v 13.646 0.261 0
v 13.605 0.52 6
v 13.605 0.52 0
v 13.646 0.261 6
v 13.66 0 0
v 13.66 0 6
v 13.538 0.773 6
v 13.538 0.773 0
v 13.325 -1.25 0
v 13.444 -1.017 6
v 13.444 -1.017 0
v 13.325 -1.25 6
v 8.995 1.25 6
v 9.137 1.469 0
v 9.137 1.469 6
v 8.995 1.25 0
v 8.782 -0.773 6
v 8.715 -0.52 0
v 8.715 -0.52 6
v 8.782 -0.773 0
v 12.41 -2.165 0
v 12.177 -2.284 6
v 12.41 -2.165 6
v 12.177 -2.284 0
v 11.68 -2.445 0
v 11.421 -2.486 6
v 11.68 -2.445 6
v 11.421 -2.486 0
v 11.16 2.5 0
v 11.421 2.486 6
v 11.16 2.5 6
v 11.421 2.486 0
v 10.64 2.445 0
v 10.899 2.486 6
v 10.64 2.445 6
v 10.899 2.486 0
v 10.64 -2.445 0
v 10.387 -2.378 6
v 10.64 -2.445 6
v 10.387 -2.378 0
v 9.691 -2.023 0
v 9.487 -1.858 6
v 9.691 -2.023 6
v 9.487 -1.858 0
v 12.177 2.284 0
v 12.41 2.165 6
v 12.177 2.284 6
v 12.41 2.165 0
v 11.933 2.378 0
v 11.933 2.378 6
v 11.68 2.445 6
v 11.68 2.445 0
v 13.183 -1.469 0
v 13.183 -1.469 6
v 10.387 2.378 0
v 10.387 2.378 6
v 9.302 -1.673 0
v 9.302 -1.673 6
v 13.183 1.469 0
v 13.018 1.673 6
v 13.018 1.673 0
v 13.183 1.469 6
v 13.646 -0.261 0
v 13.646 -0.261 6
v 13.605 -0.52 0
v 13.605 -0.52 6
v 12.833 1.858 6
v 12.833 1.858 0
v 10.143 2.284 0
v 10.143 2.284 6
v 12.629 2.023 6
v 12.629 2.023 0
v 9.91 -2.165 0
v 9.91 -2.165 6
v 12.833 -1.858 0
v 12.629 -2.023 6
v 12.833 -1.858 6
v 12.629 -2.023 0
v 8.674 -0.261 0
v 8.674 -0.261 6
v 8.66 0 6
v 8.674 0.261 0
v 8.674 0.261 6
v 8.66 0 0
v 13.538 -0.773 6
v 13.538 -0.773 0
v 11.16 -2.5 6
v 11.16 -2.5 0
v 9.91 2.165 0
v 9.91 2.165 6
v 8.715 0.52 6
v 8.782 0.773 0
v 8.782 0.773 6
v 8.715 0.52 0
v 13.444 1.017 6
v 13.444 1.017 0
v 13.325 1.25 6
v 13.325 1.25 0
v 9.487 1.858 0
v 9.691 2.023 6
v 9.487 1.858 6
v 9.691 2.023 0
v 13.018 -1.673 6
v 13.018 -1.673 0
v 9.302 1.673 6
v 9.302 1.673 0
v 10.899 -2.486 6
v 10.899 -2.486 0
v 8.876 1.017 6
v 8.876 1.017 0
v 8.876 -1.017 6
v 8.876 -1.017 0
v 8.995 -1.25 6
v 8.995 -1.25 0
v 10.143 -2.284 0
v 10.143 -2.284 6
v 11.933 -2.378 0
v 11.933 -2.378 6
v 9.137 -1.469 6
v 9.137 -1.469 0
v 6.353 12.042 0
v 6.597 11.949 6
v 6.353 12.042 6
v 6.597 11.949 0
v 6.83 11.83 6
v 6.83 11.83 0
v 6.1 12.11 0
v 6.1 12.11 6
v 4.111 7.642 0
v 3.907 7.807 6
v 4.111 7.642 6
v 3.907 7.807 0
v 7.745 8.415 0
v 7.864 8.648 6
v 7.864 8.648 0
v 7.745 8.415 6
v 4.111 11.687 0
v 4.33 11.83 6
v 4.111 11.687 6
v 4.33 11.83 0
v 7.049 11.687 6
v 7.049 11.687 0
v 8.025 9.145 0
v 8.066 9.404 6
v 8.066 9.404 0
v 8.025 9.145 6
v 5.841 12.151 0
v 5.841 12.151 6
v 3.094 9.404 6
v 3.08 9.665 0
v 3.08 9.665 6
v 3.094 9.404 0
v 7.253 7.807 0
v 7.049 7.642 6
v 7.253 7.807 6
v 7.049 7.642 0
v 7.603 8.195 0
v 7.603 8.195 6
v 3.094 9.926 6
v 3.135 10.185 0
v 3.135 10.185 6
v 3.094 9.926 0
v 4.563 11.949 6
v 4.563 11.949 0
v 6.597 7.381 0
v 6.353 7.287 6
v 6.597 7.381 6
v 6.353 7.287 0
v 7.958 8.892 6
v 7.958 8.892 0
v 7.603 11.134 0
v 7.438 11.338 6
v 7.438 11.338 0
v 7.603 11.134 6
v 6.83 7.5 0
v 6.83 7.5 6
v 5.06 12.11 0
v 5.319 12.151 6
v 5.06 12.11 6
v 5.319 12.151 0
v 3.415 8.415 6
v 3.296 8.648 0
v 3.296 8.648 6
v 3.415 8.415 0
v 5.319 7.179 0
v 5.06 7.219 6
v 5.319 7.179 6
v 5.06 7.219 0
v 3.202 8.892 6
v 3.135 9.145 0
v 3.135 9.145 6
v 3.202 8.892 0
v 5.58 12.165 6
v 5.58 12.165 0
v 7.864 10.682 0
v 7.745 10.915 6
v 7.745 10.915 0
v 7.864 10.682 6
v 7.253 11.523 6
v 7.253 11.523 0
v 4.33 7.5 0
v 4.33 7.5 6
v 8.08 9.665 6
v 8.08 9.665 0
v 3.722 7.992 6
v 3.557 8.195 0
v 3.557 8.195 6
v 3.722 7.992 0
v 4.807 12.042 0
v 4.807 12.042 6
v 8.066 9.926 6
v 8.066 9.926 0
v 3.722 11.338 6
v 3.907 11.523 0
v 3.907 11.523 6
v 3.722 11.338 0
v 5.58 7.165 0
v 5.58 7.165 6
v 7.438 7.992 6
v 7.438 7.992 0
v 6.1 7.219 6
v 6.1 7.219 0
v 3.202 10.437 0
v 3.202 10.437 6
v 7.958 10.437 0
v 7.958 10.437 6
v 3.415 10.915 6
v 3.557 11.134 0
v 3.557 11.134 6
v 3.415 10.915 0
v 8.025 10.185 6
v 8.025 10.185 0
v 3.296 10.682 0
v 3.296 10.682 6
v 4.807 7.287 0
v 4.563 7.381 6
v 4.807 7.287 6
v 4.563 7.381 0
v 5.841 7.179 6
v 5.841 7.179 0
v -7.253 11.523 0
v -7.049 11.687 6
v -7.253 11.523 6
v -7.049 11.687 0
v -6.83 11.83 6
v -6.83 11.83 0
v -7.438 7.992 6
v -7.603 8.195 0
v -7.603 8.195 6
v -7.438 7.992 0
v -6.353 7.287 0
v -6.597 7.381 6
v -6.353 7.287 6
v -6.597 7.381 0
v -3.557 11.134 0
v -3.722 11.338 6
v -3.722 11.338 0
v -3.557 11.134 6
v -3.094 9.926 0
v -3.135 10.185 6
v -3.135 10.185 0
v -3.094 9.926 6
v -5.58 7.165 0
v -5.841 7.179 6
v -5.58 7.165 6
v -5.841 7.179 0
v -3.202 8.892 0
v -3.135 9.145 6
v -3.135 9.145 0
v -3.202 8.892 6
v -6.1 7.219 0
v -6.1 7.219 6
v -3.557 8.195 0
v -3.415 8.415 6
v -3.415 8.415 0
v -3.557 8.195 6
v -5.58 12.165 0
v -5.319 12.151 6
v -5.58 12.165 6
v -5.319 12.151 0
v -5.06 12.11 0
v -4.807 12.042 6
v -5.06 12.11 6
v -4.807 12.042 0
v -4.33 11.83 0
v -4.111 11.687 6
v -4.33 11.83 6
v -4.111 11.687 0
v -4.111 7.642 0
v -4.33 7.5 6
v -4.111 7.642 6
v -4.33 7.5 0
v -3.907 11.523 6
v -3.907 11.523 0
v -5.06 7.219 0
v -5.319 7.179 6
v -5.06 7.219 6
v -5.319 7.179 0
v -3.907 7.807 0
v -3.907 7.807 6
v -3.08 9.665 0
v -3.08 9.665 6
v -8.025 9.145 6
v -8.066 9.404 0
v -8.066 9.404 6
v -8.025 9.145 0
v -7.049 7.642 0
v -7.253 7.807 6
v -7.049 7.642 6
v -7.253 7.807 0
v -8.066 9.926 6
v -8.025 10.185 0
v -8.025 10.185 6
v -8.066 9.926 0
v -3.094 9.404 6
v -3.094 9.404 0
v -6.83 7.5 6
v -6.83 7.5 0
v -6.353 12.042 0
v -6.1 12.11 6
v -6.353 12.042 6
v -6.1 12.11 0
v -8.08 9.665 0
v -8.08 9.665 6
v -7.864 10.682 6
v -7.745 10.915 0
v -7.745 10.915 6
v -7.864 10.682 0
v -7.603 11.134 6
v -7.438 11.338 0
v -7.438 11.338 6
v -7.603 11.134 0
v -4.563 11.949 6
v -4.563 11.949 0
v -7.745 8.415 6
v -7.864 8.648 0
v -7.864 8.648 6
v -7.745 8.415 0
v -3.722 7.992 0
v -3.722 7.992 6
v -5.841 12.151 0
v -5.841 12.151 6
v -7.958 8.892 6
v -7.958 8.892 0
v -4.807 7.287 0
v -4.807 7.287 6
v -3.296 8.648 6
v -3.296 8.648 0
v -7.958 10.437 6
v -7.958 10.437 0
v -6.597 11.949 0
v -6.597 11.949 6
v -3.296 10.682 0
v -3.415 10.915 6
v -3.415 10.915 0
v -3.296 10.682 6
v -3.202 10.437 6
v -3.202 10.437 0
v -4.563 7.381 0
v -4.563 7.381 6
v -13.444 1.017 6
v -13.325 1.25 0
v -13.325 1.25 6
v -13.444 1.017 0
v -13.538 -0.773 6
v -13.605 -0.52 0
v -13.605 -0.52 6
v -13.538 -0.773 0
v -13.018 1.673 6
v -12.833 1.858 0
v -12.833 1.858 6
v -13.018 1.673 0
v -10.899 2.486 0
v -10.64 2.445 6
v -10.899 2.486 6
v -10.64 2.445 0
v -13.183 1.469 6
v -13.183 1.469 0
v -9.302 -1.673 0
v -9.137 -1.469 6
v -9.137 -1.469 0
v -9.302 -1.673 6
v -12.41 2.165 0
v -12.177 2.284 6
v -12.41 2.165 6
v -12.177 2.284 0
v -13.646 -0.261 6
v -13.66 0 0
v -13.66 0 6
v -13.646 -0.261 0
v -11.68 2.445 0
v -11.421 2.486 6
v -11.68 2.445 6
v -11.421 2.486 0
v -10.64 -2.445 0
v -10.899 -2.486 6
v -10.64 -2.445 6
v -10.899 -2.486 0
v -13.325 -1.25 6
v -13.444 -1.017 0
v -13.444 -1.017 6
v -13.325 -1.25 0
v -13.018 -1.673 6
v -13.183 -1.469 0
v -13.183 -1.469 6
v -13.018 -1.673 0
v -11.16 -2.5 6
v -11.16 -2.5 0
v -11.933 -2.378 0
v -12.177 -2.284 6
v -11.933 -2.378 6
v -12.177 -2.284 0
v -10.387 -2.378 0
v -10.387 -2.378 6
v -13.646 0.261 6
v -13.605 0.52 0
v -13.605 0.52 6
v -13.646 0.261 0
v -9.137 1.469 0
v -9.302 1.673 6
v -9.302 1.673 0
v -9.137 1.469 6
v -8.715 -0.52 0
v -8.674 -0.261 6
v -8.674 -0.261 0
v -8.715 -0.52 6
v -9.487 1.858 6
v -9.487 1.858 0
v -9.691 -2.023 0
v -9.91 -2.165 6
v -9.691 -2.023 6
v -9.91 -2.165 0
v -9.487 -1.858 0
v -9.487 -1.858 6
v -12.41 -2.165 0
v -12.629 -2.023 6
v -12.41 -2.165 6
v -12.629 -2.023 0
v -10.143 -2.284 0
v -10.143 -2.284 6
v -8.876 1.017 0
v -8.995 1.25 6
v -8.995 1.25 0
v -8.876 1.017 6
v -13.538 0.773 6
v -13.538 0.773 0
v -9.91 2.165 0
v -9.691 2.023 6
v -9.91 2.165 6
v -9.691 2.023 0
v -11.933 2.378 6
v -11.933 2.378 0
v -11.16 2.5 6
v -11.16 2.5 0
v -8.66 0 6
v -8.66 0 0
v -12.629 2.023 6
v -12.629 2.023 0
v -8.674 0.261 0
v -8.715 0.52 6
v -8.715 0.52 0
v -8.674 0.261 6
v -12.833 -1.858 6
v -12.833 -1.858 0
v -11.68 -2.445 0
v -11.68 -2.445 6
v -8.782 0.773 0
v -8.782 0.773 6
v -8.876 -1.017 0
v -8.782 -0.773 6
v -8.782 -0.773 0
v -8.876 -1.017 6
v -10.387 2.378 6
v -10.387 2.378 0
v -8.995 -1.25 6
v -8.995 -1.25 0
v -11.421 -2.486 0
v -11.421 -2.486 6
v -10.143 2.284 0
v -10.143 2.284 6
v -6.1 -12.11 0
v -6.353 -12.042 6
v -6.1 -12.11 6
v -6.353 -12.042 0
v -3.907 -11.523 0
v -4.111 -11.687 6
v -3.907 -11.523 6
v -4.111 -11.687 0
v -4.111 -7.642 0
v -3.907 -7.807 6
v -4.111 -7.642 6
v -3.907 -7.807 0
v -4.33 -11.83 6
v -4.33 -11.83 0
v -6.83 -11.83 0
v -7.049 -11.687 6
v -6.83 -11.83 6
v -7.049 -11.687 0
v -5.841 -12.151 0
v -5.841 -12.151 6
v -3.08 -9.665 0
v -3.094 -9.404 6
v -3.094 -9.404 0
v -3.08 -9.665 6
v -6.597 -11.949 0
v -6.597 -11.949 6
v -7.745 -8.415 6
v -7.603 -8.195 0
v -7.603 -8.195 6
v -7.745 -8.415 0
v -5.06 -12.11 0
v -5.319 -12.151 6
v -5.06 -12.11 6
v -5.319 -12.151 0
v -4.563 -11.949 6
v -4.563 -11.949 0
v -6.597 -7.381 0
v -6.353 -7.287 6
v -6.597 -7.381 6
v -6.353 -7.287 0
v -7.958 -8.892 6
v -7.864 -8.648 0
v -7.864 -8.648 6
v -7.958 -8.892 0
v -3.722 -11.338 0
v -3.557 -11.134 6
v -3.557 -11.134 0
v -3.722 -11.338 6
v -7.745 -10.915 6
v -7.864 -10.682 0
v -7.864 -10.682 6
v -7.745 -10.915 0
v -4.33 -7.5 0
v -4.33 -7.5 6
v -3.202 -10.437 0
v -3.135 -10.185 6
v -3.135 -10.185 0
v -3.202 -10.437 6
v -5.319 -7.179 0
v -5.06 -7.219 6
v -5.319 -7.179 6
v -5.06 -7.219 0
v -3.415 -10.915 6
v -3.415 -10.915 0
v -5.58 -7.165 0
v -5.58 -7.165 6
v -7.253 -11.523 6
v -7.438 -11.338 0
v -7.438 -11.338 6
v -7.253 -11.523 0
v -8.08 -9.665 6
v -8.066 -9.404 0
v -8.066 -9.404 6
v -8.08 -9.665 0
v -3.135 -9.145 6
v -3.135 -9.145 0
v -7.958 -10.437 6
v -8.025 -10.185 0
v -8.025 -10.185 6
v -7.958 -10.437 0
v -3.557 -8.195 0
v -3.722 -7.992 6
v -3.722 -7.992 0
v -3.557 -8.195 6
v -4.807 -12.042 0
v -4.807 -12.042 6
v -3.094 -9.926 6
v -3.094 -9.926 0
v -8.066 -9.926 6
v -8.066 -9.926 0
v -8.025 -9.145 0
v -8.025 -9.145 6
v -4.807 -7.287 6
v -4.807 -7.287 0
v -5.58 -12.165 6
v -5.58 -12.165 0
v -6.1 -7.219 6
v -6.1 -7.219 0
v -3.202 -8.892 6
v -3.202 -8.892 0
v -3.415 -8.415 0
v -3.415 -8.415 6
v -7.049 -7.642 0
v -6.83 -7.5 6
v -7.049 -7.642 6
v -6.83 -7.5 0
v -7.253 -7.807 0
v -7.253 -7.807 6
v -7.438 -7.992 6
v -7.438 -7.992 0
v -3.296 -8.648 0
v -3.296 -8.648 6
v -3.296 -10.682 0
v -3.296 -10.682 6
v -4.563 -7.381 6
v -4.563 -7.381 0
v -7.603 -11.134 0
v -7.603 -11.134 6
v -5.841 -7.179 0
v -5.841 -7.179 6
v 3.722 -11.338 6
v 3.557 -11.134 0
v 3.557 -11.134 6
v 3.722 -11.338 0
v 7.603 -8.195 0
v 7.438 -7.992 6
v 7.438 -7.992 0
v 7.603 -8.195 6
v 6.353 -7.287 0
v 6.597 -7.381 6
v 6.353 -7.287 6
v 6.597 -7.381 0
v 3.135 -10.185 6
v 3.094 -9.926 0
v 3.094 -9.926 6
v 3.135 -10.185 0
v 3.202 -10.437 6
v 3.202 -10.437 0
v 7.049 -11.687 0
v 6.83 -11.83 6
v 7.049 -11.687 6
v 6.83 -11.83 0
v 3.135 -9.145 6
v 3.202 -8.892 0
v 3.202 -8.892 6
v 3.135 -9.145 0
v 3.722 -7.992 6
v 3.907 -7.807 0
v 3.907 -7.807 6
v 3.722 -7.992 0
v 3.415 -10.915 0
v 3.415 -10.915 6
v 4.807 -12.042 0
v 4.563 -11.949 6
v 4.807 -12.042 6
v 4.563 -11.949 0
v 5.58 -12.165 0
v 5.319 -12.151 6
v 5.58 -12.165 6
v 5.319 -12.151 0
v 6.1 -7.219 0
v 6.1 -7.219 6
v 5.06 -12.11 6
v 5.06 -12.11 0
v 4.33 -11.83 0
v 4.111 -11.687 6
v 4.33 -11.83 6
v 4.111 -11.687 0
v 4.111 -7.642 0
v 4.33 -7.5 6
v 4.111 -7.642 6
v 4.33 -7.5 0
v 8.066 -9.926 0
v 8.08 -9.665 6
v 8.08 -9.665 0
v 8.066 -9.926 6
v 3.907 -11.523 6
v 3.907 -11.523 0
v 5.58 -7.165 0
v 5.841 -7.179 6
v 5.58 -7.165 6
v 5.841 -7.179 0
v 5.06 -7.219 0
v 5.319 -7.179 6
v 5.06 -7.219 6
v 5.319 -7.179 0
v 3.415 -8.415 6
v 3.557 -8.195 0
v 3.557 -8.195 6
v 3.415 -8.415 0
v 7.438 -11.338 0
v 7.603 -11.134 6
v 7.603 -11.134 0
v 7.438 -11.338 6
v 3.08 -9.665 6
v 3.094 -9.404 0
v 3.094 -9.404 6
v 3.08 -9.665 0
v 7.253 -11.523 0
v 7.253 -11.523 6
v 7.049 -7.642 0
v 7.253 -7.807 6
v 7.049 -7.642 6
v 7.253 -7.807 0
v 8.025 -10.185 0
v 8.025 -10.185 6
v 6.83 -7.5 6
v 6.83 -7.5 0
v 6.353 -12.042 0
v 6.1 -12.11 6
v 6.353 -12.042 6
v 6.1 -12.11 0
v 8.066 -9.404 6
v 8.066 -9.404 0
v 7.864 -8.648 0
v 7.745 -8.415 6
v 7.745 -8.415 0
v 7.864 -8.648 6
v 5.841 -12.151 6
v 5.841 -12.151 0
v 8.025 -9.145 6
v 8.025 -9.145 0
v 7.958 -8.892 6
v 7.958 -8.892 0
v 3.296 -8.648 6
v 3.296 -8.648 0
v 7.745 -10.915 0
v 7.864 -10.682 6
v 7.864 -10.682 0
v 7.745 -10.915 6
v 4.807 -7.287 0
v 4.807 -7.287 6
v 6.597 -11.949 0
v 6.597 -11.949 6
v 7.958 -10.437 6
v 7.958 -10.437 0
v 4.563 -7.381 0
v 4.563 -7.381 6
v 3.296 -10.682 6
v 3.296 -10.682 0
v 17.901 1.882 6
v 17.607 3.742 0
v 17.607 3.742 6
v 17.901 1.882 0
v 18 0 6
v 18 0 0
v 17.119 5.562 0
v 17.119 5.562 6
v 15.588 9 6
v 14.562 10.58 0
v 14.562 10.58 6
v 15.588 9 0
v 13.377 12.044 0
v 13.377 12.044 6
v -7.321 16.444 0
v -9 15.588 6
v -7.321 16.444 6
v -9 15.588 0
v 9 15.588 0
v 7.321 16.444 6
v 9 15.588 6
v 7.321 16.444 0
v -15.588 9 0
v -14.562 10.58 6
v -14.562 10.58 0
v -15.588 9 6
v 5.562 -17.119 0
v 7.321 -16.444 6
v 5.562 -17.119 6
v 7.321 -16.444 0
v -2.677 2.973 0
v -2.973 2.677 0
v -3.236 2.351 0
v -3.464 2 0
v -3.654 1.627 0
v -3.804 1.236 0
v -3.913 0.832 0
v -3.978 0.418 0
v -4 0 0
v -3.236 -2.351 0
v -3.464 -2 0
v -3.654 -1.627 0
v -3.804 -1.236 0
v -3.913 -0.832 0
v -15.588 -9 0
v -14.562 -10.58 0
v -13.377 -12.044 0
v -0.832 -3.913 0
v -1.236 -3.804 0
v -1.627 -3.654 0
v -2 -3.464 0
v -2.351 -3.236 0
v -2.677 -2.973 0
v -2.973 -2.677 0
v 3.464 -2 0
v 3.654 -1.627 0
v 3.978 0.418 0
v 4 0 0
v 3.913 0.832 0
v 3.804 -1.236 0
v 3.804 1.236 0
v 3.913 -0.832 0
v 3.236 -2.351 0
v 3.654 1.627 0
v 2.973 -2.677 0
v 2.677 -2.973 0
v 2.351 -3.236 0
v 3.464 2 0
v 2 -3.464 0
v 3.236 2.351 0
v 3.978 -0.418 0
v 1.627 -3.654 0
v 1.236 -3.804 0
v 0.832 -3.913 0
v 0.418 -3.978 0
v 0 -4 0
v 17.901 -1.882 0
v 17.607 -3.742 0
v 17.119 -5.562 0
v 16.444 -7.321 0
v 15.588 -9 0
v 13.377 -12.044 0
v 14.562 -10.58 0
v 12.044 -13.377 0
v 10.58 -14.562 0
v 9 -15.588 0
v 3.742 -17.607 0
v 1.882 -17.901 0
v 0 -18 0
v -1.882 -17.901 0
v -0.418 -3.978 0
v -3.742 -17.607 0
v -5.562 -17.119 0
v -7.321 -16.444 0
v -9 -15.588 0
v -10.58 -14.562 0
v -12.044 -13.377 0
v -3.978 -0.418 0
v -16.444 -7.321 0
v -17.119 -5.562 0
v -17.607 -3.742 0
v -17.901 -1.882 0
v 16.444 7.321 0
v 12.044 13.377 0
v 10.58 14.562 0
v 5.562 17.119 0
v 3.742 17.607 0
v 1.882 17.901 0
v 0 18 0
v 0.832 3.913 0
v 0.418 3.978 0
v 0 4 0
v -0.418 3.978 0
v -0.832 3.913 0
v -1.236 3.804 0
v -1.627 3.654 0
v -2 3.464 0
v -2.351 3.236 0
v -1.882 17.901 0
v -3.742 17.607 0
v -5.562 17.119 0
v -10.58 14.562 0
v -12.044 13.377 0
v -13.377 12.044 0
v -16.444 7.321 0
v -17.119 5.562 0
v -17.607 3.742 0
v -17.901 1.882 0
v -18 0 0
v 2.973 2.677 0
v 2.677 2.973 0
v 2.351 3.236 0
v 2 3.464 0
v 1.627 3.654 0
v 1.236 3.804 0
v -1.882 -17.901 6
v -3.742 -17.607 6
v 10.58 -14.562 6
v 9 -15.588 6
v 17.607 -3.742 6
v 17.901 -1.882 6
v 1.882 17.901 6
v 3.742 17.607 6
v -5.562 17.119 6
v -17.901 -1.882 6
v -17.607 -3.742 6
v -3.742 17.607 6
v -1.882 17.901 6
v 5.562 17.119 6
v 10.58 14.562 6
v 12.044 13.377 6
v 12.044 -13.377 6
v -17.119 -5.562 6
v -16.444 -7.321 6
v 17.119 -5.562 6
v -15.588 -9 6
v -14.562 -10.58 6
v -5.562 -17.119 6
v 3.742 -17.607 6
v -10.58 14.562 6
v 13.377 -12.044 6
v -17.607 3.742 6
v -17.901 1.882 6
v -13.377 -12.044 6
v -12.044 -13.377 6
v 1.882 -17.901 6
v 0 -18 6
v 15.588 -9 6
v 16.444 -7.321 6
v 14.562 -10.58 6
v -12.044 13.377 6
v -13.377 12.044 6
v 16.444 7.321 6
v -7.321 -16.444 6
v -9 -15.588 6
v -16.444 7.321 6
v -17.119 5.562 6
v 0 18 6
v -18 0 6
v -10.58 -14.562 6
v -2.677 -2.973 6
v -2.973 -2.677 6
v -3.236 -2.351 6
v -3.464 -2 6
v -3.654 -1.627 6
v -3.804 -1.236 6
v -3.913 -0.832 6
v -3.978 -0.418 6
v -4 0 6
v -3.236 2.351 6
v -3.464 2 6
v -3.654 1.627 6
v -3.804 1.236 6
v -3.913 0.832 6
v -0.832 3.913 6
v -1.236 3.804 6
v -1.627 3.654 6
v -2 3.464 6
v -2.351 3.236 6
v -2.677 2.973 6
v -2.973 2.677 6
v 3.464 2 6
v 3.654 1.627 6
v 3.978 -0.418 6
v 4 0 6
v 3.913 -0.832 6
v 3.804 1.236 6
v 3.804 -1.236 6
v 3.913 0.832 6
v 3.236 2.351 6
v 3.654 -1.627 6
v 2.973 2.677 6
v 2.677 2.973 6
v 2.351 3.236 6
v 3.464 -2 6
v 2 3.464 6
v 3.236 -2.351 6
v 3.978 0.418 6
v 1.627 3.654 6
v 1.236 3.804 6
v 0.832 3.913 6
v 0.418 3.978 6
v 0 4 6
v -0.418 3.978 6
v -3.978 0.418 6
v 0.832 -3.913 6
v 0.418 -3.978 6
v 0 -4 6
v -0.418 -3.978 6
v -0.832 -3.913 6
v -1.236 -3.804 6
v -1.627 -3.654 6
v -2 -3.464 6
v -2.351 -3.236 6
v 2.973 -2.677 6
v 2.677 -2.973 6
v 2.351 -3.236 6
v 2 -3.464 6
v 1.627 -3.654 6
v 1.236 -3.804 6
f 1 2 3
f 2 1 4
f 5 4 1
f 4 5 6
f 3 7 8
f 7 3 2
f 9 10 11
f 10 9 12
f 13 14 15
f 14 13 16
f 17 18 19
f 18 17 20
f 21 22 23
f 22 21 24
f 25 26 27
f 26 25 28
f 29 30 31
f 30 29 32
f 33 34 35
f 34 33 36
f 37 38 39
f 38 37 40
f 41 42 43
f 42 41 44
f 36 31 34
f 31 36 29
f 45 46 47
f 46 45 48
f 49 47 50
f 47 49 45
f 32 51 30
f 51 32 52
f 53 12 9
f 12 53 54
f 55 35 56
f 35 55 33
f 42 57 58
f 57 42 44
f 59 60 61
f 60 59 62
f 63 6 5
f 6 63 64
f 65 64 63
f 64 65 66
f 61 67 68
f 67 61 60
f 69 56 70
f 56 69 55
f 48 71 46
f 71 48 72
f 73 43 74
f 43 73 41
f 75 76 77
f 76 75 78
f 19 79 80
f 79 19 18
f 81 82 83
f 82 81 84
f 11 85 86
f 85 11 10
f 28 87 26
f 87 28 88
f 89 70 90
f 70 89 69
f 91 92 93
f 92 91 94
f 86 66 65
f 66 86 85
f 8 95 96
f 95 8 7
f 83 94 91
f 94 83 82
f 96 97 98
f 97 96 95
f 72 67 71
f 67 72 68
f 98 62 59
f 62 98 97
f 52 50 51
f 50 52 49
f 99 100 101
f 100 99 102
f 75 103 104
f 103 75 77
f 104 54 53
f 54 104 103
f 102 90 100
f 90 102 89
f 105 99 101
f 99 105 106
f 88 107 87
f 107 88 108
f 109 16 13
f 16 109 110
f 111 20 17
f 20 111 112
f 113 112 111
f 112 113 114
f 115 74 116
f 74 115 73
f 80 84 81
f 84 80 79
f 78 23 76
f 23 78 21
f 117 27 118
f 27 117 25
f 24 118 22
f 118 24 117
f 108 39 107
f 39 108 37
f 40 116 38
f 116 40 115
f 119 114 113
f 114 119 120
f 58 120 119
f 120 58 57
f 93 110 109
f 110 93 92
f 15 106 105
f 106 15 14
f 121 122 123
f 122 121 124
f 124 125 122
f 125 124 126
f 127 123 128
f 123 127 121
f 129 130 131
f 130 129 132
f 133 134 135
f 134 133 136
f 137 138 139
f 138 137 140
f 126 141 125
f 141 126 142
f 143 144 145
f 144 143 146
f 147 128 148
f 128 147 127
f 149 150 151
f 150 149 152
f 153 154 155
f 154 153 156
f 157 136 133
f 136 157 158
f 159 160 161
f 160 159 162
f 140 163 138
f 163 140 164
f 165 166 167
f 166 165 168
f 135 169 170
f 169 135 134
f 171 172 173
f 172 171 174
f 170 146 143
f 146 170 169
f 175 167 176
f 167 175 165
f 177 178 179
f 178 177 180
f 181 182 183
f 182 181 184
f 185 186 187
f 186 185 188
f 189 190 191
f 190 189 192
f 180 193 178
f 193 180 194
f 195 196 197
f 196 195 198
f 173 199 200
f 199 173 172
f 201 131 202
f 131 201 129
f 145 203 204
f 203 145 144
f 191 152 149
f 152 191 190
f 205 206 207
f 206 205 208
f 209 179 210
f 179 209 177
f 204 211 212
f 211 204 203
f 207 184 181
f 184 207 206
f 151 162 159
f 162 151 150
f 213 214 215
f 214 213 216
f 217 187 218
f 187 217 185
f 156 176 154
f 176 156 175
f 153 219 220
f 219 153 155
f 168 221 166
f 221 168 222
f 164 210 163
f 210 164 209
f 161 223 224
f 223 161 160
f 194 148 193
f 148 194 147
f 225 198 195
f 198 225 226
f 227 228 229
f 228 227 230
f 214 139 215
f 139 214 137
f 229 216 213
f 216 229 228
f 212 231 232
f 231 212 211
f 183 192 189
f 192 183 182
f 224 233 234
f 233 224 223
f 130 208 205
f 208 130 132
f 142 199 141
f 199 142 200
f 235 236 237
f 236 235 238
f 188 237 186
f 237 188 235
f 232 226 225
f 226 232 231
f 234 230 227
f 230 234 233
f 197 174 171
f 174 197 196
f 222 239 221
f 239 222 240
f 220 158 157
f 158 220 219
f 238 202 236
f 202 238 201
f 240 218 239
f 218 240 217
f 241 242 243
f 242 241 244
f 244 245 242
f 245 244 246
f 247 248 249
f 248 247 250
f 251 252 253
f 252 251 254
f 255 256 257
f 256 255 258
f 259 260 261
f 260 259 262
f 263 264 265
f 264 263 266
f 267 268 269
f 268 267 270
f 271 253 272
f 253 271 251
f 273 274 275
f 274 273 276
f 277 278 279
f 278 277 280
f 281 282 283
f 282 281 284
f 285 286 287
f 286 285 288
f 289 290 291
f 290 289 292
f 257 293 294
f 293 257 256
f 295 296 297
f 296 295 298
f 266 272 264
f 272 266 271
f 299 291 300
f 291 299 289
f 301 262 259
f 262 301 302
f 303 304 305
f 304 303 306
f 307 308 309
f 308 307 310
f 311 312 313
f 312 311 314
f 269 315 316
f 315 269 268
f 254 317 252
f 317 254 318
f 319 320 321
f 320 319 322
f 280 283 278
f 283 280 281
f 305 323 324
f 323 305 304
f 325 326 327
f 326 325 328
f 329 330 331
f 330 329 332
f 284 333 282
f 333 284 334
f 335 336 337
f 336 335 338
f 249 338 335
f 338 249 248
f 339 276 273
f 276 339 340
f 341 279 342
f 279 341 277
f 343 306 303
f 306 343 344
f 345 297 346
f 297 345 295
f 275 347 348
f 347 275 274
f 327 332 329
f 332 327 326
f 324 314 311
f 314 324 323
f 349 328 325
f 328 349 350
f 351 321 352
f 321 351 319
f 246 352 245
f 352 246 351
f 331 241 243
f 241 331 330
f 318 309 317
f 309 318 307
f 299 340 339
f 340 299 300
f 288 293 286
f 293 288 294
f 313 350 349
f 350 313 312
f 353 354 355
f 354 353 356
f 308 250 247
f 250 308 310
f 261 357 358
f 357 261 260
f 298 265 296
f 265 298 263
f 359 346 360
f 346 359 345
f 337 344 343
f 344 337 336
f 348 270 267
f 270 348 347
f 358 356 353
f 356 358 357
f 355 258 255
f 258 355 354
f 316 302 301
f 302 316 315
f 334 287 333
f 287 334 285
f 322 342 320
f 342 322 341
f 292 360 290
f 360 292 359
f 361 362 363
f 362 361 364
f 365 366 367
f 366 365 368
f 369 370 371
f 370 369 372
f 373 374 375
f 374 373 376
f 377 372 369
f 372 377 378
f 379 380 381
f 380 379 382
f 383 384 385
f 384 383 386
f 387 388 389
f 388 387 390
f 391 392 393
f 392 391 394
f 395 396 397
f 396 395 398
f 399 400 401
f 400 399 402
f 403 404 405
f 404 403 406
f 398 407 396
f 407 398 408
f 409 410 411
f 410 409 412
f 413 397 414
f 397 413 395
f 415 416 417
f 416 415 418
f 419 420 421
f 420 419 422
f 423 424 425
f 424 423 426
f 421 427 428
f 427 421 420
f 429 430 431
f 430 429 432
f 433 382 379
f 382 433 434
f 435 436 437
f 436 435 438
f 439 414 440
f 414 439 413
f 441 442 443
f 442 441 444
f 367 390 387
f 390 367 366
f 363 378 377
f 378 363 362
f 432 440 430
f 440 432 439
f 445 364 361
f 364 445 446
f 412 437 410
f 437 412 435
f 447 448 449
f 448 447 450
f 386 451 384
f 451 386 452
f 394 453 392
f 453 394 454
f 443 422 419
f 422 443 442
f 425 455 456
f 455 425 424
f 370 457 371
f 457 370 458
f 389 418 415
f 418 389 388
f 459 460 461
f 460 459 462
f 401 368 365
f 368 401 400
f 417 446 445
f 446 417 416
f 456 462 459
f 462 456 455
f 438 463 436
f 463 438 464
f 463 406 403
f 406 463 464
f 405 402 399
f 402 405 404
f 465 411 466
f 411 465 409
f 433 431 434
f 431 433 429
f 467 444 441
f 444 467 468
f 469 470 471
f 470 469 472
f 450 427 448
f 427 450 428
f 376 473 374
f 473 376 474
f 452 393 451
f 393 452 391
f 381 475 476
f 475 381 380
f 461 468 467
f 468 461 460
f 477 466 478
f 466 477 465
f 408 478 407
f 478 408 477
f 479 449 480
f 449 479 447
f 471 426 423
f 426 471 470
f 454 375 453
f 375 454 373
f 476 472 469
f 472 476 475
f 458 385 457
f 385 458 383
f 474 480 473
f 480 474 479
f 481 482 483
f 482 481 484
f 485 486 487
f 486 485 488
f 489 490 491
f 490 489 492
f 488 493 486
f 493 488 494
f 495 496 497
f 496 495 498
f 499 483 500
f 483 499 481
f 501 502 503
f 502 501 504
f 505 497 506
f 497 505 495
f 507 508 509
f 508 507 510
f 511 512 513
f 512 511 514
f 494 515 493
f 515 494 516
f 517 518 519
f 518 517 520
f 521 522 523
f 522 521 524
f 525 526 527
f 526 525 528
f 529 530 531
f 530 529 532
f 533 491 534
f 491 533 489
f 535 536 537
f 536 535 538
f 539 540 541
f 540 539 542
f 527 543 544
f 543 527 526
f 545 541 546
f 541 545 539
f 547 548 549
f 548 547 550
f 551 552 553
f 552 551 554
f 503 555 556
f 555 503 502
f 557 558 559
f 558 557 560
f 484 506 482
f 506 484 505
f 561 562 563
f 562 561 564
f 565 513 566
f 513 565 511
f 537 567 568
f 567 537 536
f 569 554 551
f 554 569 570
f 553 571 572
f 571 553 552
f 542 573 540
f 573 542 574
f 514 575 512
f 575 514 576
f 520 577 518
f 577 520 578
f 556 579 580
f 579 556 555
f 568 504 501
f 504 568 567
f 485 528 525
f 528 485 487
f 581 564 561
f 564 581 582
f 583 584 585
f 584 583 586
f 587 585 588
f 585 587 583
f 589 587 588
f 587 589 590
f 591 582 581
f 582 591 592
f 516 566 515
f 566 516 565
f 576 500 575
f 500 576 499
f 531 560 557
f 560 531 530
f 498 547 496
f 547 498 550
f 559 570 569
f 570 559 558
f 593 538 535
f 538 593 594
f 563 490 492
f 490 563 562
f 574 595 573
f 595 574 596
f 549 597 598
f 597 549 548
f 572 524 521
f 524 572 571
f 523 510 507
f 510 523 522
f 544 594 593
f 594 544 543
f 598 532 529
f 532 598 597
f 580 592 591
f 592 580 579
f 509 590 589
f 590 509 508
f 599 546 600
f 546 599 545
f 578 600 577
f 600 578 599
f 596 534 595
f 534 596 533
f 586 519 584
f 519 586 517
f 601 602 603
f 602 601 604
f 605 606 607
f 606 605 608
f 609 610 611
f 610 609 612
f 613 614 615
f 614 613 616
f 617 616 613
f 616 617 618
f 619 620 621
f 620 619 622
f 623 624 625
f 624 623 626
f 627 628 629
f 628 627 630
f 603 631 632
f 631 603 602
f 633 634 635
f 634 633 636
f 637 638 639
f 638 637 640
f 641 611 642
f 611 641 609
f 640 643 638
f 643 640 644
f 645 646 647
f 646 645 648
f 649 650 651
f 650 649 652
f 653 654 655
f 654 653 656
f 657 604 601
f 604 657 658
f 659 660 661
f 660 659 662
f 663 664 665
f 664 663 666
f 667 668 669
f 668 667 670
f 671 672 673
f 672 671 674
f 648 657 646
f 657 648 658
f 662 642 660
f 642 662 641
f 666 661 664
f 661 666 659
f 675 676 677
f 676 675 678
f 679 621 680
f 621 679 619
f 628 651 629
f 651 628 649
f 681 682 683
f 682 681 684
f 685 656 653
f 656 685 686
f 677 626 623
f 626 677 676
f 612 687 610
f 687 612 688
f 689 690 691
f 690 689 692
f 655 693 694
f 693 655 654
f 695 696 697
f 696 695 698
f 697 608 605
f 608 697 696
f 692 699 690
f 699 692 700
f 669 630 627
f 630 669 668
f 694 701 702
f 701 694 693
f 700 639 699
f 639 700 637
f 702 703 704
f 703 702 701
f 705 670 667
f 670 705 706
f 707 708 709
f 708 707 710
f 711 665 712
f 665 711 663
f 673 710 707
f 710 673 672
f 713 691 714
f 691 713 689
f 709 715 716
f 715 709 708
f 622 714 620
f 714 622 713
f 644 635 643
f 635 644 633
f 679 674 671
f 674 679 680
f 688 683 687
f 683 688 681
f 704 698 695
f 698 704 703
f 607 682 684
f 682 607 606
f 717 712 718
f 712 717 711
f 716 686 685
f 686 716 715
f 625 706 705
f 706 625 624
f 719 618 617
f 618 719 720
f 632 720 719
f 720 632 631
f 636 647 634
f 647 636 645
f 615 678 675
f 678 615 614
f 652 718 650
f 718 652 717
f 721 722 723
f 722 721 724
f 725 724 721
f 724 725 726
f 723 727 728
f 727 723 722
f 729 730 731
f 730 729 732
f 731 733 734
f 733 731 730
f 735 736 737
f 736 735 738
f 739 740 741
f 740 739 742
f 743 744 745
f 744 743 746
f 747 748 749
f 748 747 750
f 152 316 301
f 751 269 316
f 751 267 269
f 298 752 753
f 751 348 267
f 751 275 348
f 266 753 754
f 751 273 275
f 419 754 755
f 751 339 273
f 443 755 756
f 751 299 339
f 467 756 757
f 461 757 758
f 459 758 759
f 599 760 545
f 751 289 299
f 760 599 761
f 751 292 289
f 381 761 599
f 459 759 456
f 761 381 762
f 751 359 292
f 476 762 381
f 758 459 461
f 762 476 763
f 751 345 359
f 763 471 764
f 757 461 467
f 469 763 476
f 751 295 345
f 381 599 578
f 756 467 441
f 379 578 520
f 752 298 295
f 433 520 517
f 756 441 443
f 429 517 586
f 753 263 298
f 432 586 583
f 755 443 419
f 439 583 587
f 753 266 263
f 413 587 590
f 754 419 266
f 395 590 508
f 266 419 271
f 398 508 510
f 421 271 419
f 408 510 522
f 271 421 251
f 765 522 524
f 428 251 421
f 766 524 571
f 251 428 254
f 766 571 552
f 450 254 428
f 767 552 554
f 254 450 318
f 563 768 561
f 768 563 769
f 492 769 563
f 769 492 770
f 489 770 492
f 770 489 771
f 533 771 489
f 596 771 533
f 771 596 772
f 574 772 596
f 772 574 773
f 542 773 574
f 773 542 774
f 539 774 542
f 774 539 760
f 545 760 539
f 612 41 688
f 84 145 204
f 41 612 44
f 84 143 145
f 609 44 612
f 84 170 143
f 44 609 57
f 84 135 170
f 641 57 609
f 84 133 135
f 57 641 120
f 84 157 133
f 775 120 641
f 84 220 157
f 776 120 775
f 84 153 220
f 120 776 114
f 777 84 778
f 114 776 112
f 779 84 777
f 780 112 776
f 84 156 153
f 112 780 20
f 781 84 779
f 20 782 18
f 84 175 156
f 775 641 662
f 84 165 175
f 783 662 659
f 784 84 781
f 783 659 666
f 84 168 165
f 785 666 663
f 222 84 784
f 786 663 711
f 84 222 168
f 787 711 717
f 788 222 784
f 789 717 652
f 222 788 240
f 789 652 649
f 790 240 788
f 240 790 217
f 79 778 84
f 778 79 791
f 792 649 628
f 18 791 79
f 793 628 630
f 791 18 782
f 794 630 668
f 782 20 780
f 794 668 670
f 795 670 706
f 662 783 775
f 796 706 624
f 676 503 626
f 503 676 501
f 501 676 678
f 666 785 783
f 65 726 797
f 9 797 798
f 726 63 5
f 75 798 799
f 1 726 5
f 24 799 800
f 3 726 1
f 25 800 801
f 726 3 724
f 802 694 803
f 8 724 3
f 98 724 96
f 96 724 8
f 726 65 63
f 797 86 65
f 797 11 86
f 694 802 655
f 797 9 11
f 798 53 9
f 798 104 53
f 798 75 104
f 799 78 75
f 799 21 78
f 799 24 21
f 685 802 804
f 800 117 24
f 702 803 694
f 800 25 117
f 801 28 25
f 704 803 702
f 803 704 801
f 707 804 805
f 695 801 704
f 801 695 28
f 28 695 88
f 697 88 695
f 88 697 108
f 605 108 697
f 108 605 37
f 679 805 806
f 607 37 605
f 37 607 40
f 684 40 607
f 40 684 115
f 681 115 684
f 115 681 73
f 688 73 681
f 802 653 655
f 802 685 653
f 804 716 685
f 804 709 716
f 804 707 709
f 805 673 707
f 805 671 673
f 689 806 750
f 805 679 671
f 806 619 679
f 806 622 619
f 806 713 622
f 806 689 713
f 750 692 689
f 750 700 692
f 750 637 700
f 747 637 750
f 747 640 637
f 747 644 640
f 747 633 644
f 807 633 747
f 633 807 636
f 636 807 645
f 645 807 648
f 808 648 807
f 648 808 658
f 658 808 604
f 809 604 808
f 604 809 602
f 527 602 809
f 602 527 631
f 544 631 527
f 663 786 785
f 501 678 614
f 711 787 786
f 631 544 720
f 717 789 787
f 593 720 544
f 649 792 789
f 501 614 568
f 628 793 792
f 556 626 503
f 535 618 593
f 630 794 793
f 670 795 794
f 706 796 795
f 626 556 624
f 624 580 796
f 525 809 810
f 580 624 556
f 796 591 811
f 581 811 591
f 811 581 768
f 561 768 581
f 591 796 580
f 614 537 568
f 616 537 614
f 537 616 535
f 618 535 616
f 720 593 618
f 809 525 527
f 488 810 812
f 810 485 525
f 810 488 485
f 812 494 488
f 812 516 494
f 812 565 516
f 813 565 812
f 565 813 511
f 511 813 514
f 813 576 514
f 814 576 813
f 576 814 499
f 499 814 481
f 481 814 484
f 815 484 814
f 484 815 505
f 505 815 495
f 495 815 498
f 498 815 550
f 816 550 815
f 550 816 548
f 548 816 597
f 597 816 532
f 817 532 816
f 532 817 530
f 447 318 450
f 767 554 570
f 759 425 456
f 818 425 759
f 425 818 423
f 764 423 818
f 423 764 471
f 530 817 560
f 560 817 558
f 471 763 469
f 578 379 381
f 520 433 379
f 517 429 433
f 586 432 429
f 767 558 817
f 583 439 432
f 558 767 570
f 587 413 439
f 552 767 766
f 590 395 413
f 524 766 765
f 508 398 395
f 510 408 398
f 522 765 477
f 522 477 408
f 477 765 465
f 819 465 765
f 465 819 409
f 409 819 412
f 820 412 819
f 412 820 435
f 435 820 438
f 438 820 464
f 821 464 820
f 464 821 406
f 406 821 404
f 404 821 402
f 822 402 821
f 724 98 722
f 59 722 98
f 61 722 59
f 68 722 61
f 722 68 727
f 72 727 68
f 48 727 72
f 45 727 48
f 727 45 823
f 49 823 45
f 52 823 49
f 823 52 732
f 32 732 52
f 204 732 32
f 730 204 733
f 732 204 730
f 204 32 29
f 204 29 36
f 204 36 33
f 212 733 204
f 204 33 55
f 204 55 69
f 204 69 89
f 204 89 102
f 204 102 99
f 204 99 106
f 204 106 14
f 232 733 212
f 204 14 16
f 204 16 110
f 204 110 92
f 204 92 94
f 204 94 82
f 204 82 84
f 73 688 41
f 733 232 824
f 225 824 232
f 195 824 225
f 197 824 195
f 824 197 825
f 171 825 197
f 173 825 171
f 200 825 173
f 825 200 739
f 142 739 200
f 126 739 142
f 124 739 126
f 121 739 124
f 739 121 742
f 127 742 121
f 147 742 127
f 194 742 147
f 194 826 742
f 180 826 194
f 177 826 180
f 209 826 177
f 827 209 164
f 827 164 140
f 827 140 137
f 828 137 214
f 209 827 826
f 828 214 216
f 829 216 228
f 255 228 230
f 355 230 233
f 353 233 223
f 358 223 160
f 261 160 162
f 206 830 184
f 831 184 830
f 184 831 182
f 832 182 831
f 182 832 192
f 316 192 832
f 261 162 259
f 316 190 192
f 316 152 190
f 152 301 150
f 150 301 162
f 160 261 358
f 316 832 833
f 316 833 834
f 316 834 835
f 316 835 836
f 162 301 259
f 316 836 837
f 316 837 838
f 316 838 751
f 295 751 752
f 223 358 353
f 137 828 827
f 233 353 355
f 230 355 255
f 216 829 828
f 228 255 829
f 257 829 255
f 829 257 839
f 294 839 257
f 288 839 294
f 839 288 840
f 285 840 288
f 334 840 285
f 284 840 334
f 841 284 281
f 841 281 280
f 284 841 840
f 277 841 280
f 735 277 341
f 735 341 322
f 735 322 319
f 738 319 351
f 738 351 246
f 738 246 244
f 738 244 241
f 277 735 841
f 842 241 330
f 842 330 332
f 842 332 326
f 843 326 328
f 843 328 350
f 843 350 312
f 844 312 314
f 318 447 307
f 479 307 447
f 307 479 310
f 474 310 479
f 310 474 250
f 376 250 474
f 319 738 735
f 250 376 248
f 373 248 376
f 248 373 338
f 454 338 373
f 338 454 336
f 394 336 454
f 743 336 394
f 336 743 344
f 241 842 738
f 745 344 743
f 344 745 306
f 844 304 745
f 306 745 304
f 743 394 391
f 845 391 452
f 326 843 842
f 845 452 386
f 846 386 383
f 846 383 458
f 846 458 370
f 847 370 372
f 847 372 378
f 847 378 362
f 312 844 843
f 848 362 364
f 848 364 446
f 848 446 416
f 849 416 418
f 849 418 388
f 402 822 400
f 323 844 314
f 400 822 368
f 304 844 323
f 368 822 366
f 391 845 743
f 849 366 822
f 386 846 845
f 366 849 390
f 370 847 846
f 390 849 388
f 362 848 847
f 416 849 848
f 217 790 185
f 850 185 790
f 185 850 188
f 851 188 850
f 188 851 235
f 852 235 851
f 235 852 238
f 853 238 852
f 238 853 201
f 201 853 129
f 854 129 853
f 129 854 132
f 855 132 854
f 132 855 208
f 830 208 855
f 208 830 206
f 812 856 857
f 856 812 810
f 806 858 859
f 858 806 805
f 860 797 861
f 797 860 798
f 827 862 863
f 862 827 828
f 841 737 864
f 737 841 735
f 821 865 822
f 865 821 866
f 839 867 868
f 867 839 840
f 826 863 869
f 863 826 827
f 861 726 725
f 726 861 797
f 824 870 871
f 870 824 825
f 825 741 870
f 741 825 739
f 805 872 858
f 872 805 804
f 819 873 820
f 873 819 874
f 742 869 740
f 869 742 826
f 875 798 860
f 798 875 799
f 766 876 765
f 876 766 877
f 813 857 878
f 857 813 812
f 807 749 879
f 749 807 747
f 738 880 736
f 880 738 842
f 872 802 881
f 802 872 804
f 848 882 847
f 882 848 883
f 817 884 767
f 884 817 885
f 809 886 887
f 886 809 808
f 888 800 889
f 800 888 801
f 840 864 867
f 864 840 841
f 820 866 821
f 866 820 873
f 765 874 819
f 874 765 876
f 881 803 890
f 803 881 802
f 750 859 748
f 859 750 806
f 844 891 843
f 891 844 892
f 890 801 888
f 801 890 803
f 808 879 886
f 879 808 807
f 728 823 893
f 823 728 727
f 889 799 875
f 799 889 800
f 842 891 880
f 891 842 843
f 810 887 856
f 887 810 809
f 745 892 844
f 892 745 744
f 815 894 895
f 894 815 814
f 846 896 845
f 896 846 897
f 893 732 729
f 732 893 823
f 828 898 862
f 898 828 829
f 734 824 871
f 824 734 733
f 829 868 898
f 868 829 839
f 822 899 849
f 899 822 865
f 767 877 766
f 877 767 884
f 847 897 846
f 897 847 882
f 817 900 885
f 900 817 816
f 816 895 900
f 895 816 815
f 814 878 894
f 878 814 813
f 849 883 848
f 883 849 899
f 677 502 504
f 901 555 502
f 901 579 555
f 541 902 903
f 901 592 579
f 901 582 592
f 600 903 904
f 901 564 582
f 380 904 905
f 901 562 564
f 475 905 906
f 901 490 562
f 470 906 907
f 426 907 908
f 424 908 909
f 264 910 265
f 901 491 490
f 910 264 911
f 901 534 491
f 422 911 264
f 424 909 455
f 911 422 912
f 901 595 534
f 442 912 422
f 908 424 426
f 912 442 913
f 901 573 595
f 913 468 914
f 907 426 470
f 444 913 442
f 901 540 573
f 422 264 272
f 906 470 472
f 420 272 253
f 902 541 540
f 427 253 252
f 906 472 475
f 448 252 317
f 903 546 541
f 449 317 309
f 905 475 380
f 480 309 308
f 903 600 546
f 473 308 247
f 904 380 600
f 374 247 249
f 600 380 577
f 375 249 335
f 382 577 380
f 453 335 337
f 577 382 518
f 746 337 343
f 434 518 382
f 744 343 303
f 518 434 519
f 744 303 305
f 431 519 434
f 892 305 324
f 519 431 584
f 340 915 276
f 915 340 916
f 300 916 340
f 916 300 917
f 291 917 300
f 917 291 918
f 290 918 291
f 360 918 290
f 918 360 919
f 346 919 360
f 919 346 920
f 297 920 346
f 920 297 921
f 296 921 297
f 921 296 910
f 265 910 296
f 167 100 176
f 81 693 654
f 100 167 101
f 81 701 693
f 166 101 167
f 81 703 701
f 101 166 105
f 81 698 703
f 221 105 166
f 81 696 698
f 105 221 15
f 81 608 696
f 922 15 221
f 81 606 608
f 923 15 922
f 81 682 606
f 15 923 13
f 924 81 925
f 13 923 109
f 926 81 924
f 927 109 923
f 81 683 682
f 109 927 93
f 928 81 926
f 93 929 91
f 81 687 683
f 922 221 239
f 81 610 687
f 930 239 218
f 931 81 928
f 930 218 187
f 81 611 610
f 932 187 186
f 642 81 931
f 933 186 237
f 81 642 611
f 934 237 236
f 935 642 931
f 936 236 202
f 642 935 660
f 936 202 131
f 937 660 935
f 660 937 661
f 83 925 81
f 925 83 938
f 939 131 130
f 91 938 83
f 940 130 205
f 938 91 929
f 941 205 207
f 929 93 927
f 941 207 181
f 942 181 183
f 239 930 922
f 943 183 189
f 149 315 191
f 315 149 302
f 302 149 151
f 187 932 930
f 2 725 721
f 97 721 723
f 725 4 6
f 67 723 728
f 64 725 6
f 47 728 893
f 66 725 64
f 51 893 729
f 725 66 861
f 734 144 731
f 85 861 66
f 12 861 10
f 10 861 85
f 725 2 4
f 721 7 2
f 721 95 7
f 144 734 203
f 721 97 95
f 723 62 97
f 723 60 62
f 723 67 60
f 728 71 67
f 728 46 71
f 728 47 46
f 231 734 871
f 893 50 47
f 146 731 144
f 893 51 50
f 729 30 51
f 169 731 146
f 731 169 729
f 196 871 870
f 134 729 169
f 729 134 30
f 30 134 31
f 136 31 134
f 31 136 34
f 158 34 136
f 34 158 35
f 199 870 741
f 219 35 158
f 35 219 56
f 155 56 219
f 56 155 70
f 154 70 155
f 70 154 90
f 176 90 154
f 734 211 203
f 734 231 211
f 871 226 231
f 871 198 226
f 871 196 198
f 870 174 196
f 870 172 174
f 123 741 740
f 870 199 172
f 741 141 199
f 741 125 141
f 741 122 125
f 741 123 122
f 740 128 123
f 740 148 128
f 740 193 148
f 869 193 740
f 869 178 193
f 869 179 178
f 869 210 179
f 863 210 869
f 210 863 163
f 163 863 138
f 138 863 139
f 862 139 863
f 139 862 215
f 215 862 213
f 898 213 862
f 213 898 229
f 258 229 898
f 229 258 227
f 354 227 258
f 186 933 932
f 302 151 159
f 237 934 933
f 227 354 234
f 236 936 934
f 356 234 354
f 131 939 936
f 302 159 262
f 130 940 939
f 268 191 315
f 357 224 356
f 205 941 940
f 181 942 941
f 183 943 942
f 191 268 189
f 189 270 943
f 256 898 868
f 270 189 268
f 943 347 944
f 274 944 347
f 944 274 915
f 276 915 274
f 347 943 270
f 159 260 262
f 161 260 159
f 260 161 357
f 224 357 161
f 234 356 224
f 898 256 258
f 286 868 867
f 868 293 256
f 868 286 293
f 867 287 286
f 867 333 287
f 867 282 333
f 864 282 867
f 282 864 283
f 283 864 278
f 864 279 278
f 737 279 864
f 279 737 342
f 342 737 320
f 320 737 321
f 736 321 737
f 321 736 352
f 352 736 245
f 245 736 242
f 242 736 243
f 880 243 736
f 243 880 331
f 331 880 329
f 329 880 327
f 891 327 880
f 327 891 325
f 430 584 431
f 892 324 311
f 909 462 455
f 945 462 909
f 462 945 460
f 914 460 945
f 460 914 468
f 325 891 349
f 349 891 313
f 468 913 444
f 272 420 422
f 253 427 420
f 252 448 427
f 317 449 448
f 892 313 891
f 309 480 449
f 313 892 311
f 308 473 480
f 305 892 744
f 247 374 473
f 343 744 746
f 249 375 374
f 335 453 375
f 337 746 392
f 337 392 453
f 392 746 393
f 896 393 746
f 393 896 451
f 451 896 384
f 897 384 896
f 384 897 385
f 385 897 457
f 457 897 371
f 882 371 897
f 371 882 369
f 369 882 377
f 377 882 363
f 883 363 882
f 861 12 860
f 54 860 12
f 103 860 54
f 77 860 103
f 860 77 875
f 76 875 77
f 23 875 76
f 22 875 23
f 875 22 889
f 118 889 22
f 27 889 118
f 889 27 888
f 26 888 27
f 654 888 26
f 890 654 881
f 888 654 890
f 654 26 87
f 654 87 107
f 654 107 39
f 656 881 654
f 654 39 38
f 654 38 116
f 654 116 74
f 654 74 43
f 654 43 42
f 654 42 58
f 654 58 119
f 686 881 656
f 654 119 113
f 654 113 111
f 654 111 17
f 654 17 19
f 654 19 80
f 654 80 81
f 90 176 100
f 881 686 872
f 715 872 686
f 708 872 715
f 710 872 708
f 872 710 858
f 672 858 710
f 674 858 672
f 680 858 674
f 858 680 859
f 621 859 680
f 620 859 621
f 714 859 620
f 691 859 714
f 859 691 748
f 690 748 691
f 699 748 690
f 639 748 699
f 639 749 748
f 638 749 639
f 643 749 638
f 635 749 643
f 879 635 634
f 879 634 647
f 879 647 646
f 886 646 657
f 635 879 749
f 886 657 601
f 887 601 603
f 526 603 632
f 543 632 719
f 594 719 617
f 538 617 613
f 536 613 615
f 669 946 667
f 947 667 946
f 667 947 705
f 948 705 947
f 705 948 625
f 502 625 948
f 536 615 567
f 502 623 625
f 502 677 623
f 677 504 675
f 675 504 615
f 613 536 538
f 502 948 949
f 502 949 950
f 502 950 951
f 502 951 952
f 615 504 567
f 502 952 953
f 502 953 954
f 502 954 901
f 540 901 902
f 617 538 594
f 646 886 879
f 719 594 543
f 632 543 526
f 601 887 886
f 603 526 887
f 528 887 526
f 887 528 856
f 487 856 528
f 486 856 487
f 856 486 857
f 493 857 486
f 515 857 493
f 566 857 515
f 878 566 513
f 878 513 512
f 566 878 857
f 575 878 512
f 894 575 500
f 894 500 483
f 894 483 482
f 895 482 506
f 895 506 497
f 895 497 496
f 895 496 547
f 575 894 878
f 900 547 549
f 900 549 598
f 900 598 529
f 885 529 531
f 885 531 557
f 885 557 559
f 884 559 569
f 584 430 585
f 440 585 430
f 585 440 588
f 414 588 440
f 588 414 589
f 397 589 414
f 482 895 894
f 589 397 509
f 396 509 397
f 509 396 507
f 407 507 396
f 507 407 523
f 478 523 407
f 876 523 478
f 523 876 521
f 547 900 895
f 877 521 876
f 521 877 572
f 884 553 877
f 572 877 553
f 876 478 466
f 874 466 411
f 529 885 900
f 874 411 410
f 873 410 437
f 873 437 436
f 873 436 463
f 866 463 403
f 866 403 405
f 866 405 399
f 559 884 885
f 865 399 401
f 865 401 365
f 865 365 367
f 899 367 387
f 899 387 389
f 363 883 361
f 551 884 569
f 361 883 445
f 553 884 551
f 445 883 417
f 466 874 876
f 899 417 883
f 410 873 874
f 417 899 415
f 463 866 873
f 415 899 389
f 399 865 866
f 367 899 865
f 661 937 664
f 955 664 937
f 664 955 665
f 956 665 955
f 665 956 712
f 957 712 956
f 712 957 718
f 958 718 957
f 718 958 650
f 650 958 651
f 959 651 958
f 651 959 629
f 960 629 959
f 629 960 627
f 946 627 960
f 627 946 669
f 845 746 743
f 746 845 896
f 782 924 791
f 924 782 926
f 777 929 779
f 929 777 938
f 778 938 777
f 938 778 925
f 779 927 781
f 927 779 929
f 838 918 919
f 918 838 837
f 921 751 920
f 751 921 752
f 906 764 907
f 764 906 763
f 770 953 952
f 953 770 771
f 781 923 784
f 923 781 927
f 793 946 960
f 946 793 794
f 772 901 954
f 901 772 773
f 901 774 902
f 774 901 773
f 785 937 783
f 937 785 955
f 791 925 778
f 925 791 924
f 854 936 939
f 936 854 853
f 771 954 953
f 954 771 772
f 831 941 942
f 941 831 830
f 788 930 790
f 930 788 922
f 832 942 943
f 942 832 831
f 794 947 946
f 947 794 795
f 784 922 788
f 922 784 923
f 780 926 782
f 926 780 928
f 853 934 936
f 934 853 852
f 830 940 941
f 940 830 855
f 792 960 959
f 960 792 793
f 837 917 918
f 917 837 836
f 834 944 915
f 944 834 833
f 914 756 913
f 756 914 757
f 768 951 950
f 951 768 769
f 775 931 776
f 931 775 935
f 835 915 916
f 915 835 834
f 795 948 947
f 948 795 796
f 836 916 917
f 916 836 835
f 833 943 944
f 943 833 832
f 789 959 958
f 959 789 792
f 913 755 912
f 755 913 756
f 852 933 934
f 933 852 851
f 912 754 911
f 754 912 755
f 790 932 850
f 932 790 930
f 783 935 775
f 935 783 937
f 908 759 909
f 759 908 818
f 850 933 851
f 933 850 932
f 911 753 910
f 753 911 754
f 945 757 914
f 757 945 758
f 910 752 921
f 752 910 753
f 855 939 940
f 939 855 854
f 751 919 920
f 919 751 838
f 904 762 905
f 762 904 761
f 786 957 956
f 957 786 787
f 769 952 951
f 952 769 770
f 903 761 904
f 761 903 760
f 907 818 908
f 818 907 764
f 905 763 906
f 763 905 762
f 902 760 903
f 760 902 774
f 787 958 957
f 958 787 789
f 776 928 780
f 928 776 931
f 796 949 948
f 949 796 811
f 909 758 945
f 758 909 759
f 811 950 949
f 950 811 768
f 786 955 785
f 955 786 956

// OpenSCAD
// Lightweight sprocket blank.
$fn = 60;
eps = 0.02;
bore_d = 8;
outer_d = 36;
spoke_holes = 6;
thickness = 6;
difference() { cylinder(d=outer_d,h=thickness); translate([0,0,-eps]) cylinder(d=bore_d,h=thickness+2*eps); for(i=[0:spoke_holes-1]) rotate([0,0,i*360/spoke_holes]) translate([outer_d*0.31,0,-eps]) cylinder(d=5,h=thickness+2*eps); }
